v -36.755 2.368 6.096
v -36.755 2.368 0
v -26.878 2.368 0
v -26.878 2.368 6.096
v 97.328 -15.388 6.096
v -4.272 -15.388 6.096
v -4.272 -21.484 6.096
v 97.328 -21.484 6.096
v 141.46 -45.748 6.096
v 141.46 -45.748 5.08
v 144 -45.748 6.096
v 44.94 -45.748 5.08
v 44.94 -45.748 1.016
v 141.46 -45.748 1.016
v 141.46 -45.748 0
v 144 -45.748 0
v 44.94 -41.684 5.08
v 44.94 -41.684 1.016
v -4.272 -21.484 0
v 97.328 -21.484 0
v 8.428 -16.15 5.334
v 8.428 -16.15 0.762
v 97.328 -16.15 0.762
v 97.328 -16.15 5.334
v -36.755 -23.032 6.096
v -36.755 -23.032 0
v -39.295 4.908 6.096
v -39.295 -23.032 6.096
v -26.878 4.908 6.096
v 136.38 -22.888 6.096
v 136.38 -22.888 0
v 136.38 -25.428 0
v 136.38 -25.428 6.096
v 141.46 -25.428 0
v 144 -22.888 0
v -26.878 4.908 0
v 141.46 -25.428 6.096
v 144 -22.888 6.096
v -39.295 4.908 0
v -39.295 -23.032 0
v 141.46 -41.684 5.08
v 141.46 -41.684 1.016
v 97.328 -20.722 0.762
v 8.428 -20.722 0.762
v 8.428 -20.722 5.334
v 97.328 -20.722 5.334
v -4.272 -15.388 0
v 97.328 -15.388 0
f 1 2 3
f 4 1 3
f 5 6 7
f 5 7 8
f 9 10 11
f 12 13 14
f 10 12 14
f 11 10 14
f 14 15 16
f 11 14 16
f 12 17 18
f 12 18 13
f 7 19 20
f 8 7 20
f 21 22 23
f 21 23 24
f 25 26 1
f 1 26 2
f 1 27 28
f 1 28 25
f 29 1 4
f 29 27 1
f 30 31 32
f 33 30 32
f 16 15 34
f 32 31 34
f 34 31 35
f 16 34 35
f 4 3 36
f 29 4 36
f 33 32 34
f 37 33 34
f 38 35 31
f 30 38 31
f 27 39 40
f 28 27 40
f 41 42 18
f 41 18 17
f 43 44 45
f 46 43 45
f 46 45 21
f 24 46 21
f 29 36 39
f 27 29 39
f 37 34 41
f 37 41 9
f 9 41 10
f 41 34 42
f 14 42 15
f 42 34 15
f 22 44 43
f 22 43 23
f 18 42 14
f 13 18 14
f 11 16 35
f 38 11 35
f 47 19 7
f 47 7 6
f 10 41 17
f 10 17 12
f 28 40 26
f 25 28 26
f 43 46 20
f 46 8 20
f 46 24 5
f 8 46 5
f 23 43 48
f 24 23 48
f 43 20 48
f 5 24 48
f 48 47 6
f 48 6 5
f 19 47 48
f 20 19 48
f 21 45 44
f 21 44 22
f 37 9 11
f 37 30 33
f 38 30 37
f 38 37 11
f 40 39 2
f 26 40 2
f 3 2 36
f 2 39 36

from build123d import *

# Parameters (mm, degrees)
F1_DEPTH = 6.096
F2_W     = 101.6
F2_H     = 6.096
F3_DEPTH = 6.096
F4_W     = 4.572
F4_H     = 4.572
F5_DEPTH = 88.9
F7_DEPTH = 6.096
F8_W     = 4.064
F8_H     = 4.064
F9_DEPTH = 96.52


with BuildPart() as f1:
    # F0 (on Top) → F1 (new body)
    with BuildSketch(Plane.XY):
        Polygon((-26.877569, 2.36775), (-26.877569, 4.90775), (-39.295337, 4.90775), (-39.295337, -23.03225), (-36.755337, -23.03225), (-36.755337, 2.36775), align=None)
    extrude(amount=F1_DEPTH)


with BuildPart() as f3:
    # F2 (on Top) → F3 (new body)
    with BuildSketch(Plane.XY):
        with Locations((46.528293, -18.435688)):
            Rectangle(F2_W, F2_H)
    extrude(amount=F3_DEPTH)

    # F4 (on face) → F5 (cut)
    with BuildSketch(Plane.YZ.offset(97.328293)):
        with Locations((-18.435688, 3.048)):
            Rectangle(F4_W, F4_H)
    extrude(amount=-F5_DEPTH, mode=Mode.SUBTRACT)


with BuildPart() as f7:
    # F6 (on Top) → F7 (new body)
    with BuildSketch(Plane.XY):
        Polygon((141.459931, -25.428247), (141.459931, -45.748247), (143.999931, -45.748247), (143.999931, -22.888247), (136.379931, -22.888247), (136.379931, -25.428247), align=None)
    extrude(amount=F7_DEPTH)

    # F8 (on face) → F9 (join)
    with BuildSketch(Plane(origin=(141.459931, 0, 0), x_dir=(0, -1, 0), z_dir=(-1, 0, 0))):
        with Locations((43.716247, 3.048)):
            Rectangle(F8_W, F8_H)
    extrude(amount=F9_DEPTH)


solid = Compound([f1.part, f3.part, f7.part])
